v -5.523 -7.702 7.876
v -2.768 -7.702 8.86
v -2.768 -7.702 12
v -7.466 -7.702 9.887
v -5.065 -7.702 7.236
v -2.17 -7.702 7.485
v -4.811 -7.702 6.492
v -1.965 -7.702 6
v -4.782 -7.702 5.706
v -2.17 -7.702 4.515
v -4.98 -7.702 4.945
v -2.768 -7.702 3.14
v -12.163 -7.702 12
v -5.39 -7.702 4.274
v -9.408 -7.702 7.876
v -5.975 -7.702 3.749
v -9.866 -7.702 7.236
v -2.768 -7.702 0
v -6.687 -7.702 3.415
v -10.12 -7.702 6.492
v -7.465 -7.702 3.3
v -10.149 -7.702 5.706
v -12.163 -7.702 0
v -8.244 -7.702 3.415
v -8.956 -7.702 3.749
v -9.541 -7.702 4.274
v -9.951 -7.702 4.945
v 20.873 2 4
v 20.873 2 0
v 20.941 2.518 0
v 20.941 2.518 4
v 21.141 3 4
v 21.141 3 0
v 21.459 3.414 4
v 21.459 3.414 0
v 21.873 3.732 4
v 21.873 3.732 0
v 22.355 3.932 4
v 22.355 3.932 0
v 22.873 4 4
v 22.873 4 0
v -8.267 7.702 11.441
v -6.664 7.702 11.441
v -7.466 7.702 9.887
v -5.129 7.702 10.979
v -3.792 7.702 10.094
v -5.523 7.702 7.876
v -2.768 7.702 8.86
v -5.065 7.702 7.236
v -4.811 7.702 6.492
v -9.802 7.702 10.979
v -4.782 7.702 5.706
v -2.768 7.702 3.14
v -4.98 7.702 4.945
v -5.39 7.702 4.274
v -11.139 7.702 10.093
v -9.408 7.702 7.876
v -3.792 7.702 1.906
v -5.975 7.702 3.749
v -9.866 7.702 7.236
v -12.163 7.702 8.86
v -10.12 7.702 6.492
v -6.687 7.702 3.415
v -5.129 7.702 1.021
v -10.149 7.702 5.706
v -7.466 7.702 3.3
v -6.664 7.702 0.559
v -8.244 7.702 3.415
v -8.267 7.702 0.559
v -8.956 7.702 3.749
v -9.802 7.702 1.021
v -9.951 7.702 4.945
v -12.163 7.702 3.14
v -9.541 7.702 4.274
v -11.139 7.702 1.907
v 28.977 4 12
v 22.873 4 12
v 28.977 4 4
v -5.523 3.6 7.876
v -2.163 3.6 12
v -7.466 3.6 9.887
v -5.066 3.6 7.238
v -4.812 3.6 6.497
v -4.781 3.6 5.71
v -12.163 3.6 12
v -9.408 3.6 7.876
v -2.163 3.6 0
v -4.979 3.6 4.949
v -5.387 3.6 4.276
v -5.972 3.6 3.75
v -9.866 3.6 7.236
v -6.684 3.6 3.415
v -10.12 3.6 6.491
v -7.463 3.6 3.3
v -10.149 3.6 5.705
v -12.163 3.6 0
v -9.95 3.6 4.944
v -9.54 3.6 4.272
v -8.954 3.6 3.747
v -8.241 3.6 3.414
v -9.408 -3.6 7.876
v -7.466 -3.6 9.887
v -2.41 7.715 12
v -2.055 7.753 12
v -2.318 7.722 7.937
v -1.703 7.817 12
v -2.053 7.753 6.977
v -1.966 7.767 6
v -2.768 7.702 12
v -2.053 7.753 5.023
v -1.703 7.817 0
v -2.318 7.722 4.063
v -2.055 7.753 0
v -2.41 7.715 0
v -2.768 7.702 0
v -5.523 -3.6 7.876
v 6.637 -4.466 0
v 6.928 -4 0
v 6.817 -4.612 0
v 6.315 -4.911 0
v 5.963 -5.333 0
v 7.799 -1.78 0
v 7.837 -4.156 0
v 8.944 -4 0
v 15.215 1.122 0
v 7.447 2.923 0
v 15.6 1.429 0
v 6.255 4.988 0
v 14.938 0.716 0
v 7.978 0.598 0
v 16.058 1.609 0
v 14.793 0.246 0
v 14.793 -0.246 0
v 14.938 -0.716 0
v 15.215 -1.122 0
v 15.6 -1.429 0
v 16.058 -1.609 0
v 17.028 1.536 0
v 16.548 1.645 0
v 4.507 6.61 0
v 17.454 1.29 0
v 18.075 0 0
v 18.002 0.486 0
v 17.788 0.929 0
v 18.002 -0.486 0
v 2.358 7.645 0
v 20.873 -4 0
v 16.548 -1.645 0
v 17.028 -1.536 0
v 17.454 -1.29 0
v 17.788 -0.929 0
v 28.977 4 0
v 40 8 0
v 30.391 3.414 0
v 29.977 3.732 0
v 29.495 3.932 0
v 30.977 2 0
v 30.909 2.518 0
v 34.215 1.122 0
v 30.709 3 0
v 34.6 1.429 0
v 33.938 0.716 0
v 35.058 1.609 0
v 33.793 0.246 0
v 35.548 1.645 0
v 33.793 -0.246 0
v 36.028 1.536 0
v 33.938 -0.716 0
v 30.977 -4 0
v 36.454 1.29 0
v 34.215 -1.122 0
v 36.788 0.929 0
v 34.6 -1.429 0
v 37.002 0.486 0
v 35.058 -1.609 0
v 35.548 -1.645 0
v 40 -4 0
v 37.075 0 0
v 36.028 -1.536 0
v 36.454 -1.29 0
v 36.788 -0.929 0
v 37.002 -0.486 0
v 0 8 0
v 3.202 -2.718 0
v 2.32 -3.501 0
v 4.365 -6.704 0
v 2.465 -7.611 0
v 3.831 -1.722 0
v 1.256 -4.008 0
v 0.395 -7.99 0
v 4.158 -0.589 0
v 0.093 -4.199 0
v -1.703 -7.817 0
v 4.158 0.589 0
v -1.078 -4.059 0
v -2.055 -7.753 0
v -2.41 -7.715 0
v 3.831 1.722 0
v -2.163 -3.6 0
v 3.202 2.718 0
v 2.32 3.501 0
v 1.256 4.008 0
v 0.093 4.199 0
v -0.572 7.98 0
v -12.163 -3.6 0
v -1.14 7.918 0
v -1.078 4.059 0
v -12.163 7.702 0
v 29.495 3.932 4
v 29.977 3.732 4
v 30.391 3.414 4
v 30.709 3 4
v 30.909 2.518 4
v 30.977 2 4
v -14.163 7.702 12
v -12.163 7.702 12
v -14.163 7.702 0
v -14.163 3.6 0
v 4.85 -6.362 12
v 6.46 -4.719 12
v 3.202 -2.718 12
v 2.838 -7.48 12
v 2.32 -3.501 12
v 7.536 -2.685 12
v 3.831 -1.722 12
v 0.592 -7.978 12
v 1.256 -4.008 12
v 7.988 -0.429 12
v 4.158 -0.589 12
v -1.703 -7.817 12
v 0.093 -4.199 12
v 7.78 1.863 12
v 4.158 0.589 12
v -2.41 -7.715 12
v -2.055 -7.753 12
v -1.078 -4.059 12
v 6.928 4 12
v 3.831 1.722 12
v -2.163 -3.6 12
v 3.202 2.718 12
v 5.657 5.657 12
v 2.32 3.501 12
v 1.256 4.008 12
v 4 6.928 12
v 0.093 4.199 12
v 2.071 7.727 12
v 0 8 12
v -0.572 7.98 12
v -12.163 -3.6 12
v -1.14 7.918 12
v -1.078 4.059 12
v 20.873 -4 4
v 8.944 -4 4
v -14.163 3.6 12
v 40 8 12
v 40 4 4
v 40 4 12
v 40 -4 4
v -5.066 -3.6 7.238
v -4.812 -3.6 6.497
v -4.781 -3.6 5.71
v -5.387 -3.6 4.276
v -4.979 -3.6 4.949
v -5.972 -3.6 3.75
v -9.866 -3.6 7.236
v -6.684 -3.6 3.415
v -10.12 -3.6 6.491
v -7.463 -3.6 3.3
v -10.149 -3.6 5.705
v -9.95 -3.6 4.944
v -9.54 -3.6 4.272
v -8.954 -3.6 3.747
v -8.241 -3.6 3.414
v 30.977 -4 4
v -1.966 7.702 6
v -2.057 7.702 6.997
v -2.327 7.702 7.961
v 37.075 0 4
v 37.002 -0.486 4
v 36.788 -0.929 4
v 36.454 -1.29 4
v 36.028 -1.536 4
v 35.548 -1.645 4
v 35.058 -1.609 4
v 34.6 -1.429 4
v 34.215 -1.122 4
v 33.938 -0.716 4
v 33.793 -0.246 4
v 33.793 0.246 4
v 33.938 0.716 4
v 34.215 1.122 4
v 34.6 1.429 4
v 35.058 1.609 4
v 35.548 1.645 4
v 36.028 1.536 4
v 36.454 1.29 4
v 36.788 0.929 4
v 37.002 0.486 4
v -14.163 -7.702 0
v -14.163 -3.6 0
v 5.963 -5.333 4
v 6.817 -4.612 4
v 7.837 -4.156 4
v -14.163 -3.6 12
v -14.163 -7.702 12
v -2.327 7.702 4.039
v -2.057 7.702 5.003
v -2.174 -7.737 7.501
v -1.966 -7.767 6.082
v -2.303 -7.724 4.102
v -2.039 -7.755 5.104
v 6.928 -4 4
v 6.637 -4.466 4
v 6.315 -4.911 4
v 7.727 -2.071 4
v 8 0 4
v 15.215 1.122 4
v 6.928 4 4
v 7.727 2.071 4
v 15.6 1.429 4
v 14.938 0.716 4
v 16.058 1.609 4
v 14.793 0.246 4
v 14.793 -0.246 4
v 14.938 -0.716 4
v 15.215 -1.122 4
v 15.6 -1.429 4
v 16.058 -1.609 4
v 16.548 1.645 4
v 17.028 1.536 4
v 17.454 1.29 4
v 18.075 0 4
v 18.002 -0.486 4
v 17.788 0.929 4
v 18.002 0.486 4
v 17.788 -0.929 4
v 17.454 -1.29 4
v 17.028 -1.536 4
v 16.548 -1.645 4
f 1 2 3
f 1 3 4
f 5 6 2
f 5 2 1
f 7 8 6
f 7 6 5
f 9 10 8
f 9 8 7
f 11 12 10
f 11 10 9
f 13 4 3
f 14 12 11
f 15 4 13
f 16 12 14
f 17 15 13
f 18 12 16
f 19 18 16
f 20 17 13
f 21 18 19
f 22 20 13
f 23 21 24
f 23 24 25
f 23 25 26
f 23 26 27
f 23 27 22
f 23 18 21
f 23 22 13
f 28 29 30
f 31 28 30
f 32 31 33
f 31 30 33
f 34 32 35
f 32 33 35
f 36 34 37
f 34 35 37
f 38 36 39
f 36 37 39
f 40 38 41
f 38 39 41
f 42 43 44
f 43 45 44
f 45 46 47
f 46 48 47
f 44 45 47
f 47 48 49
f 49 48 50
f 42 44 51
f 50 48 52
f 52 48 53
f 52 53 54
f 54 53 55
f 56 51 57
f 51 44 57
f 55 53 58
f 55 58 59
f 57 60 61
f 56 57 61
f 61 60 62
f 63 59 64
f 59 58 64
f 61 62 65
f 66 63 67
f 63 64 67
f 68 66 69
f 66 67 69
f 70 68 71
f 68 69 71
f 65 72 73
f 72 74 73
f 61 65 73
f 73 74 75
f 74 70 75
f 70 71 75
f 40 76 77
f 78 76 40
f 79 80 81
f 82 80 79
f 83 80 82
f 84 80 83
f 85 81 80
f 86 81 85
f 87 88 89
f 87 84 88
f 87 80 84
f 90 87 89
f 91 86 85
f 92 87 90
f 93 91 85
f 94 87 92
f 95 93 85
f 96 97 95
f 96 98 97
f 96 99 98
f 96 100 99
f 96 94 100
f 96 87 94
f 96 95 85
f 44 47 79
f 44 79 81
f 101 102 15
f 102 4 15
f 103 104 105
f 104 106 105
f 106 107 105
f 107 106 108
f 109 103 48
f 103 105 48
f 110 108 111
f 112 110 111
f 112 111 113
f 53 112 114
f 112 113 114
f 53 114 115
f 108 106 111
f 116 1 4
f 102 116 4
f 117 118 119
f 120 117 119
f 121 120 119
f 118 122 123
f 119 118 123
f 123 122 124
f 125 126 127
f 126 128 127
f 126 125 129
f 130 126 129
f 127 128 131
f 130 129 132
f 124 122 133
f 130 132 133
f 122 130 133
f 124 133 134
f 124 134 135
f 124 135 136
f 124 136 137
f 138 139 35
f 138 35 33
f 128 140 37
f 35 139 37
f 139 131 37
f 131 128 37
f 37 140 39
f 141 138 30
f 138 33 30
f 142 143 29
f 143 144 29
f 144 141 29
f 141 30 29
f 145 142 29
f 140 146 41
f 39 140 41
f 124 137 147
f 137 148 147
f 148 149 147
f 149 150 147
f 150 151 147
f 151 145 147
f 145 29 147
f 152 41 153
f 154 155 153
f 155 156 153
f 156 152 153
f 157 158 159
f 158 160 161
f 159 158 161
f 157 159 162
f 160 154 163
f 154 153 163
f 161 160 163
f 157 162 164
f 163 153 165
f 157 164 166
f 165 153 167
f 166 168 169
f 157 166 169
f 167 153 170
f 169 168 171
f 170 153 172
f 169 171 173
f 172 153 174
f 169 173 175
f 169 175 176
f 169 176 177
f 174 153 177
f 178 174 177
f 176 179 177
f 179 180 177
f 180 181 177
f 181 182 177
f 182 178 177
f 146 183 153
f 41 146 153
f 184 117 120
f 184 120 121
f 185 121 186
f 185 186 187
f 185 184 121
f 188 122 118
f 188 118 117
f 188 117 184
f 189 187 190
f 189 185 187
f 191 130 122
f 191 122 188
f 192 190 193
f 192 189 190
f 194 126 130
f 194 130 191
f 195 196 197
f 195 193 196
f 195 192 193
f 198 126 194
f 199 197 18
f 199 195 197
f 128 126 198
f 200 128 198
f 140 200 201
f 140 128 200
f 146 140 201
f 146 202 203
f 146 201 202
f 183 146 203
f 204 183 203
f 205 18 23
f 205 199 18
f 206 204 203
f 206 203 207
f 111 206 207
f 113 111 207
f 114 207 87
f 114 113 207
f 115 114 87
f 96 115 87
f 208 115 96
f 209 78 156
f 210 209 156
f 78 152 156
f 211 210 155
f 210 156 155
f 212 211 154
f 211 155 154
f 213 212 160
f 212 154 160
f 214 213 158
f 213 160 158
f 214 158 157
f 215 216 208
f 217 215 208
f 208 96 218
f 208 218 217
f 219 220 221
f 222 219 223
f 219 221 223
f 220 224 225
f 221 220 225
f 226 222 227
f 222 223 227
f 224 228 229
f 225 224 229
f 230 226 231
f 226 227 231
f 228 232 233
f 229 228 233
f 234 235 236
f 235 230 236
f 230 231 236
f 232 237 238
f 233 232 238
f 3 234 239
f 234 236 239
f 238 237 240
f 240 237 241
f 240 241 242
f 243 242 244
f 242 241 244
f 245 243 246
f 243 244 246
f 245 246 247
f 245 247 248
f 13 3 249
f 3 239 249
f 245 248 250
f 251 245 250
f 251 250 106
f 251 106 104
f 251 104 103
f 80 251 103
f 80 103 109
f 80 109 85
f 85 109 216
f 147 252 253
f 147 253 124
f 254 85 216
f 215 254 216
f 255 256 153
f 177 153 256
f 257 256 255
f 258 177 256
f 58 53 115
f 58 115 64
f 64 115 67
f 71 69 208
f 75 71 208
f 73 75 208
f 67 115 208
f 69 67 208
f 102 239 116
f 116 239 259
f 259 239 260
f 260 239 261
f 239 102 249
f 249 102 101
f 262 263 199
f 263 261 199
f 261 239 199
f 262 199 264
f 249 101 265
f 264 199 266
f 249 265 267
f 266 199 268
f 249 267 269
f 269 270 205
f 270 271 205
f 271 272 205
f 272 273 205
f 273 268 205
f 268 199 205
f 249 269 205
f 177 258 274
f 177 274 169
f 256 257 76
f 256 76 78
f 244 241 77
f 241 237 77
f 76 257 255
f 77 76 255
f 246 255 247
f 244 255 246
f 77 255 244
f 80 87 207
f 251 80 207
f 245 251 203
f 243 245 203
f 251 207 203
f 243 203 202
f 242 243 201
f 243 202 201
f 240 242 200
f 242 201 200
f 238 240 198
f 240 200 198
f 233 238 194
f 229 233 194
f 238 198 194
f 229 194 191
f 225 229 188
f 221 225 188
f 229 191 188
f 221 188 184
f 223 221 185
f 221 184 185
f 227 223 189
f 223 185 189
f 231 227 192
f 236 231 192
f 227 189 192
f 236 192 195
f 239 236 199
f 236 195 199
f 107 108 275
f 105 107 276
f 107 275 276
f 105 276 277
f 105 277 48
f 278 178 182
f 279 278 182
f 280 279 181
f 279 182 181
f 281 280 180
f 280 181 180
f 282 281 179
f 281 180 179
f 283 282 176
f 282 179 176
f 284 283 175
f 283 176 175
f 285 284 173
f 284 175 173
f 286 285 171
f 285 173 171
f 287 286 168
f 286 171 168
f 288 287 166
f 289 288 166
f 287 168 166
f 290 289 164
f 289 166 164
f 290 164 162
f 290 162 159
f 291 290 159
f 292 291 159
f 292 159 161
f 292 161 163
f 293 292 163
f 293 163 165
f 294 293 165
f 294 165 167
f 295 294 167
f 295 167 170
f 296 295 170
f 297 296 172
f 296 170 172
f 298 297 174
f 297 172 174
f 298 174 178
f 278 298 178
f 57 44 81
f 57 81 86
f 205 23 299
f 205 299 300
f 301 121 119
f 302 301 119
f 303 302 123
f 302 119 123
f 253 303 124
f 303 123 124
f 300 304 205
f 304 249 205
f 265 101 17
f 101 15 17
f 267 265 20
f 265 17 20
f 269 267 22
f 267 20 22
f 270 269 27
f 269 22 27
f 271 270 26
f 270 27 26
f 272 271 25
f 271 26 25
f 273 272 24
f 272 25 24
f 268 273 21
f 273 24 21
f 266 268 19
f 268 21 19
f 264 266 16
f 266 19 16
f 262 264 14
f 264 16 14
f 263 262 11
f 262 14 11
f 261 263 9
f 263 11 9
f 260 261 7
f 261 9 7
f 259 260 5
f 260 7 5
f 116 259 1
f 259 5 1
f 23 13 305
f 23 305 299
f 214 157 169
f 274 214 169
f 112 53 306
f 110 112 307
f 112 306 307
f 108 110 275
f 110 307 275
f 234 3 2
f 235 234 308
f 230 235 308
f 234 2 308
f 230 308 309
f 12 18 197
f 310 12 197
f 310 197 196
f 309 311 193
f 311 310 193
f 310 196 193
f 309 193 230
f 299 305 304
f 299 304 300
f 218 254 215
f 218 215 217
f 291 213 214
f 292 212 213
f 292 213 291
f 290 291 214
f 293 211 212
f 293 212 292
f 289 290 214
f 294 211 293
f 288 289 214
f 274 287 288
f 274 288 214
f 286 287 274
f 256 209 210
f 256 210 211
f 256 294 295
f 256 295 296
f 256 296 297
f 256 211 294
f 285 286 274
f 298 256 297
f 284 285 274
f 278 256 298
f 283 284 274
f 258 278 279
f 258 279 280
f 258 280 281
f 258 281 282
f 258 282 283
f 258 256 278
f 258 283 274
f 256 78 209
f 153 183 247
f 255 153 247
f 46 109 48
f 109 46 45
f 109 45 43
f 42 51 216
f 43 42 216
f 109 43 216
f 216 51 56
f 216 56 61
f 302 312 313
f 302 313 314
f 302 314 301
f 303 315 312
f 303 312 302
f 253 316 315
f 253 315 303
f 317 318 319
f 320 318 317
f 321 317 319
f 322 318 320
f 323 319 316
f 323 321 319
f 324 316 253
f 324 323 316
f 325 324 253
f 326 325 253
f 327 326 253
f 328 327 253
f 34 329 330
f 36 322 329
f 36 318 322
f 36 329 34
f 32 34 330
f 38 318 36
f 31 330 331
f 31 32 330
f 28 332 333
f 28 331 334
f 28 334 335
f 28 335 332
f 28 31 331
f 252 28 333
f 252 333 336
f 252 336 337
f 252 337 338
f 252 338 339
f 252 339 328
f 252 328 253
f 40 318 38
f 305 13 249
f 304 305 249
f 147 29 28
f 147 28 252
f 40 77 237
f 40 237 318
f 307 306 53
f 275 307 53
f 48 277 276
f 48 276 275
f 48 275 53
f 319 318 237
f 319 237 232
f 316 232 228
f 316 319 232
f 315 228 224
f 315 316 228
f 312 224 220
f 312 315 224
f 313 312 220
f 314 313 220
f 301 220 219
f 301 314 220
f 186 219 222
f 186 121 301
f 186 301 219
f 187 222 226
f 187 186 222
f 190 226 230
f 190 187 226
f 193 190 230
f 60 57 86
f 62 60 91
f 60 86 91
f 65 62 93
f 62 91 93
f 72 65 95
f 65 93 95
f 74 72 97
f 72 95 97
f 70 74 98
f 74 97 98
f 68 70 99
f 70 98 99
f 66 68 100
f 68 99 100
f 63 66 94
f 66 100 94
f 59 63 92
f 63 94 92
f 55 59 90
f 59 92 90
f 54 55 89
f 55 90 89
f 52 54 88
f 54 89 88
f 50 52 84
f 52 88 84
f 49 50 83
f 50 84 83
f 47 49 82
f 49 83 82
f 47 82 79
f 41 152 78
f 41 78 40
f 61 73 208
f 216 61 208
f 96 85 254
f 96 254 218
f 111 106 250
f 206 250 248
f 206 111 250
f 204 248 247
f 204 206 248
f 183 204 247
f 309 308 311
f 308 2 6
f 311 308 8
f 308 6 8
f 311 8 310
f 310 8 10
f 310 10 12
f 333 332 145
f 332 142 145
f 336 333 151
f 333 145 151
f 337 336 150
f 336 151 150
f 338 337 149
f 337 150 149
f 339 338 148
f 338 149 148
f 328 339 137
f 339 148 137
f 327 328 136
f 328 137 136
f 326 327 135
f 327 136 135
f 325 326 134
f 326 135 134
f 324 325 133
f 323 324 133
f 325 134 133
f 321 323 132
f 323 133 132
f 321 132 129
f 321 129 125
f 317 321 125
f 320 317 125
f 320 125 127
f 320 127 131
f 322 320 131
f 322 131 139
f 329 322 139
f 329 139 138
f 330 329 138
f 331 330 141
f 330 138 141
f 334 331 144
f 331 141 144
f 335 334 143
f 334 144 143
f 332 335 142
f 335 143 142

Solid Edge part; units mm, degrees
sketch "Sketch1" plane through (0, 0, 0) normal (0, 0, 1) x (1, 0, 0)
  line L0 (-2.7678, -7.7019) -> (-12.1633, -7.7019)
  line L1 (-12.1633, -7.7019) -> (-12.1633, -3.6)
  line L2 (-2.1633, -3.6) -> (-12.1633, -3.6)
  arc A0 (-2.1633, 3.6) -> (-2.1633, -3.6) centre (0, 0) cw
  line L3 (-2.1633, 3.6) -> (-12.1633, 3.6)
  line L4 (-12.1633, 7.7019) -> (-12.1633, 3.6)
  line L5 (-2.7678, 7.7019) -> (-12.1633, 7.7019)
  arc A1 (-2.7678, 7.7019) -> (-1.7032, 7.8166) centre (-2.7678, 12.7019) ccw
  arc A2 (-1.7032, 7.8166) -> (-1.7032, -7.8166) centre (0, 0) cw
  arc A3 (-2.7678, -7.7019) -> (-1.7032, -7.8166) centre (-2.7678, -12.7019) cw
extrude "Protrusion1" add sketch "Sketch1" along normal blind 12
sketch "Sketch2" plane through (-7.4655, -7.7019, 6) normal (0, -1, 0) x (1, 0, 0)
  circle A0 centre (0, 0) radius 5.5
extrude "Cutout1" cut sketch "Sketch2" along normal through all
sketch "Sketch3" plane through (-7.4655, -7.7019, 6) normal (0, -1, 0) x (1, 0, 0)
  line L0 (0, 3.8868) -> (-1.9422, 1.8756)
  line L1 (1.9422, 1.8756) -> (0, 3.8868)
  arc A0 (1.9422, 1.8756) -> (-1.9422, 1.8755) centre (0, 0) cw
extrude "Cutout2" cut sketch "Sketch3" against normal through all
sketch "Sketch4" plane through (40, 0, 0) normal (1, 0, 0) x (0, 1, 0)
  line L0 (8, 0) -> (8, 12)
  line L1 (4, 12) -> (8, 12)
  line L2 (4, 12) -> (4, 4)
  line L3 (4, 4) -> (-4, 4)
  line L4 (-4, 4) -> (-4, 0)
  line L5 (8, 0) -> (-4, 0)
  dimension "D1" = 4
  dimension "D2" = 12
extrude "ExtrudedProtrusion_2" add sketch "Sketch4" against normal up to next
sketch "Sketch5" plane through (-7.4655, 7.7019, 6) normal (0, 1, 0) x (1, 0, 0)
  circle A0 centre (0, 0) radius 5.5
extrude "Cutout3" cut sketch "Sketch5" along normal through all
fillet "Round_1" radius 4 1 edges at (6.9282, -4, 2)
sketch "Sketch6" plane through (0, 0, 0) normal (0, 0, 1) x (1, 0, 0)
  arc A0 (22.8729, 4) -> (20.8729, 2) centre (22.8729, 2) ccw
  line L0 (28.9771, 4) -> (22.8729, 4)
  arc A1 (30.9771, 2) -> (28.9771, 4) centre (28.9771, 2) ccw
  line L1 (30.9771, 2) -> (30.9771, -5.7679)
  line L2 (20.8729, 2) -> (20.8729, -5.7679)
extrude "Cutout4" cut sketch "Sketch6" along normal through all material side at (21.494, 3.3789, 0)
sketch "Sketch7" plane through (0, 0, 0) normal (0, 0, 1) x (1, 0, 0)
  circle A0 centre (16.425, 0) radius 1.65
  circle A1 centre (35.425, 0) radius 1.65
  dimension "D1" = 3.3
  dimension "D2" = 19
  dimension "D3" = 9.5
extrude "Cutout5" cut sketch "Sketch7" along normal through all
sketch "Sketch8" plane through (-12.1633, 5.651, 6) normal (-1, 0, 0) x (0, -1, 0)
  line L0 (2.051, 6) -> (-2.051, 6)
  line L1 (-2.051, 6) -> (-2.051, -6)
  line L2 (2.051, -6) -> (-2.051, -6)
  line L3 (2.051, 6) -> (2.051, -6)
  line L4 (9.251, 6) -> (9.251, -6)
  line L5 (13.3529, -6) -> (9.251, -6)
  line L6 (13.3529, 6) -> (13.3529, -6)
  line L7 (13.3529, 6) -> (9.251, 6)
extrude "ExtrudedProtrusion_3" add sketch "Sketch8" along normal blind 2
properties material "ABS Plastic, medium impact"
